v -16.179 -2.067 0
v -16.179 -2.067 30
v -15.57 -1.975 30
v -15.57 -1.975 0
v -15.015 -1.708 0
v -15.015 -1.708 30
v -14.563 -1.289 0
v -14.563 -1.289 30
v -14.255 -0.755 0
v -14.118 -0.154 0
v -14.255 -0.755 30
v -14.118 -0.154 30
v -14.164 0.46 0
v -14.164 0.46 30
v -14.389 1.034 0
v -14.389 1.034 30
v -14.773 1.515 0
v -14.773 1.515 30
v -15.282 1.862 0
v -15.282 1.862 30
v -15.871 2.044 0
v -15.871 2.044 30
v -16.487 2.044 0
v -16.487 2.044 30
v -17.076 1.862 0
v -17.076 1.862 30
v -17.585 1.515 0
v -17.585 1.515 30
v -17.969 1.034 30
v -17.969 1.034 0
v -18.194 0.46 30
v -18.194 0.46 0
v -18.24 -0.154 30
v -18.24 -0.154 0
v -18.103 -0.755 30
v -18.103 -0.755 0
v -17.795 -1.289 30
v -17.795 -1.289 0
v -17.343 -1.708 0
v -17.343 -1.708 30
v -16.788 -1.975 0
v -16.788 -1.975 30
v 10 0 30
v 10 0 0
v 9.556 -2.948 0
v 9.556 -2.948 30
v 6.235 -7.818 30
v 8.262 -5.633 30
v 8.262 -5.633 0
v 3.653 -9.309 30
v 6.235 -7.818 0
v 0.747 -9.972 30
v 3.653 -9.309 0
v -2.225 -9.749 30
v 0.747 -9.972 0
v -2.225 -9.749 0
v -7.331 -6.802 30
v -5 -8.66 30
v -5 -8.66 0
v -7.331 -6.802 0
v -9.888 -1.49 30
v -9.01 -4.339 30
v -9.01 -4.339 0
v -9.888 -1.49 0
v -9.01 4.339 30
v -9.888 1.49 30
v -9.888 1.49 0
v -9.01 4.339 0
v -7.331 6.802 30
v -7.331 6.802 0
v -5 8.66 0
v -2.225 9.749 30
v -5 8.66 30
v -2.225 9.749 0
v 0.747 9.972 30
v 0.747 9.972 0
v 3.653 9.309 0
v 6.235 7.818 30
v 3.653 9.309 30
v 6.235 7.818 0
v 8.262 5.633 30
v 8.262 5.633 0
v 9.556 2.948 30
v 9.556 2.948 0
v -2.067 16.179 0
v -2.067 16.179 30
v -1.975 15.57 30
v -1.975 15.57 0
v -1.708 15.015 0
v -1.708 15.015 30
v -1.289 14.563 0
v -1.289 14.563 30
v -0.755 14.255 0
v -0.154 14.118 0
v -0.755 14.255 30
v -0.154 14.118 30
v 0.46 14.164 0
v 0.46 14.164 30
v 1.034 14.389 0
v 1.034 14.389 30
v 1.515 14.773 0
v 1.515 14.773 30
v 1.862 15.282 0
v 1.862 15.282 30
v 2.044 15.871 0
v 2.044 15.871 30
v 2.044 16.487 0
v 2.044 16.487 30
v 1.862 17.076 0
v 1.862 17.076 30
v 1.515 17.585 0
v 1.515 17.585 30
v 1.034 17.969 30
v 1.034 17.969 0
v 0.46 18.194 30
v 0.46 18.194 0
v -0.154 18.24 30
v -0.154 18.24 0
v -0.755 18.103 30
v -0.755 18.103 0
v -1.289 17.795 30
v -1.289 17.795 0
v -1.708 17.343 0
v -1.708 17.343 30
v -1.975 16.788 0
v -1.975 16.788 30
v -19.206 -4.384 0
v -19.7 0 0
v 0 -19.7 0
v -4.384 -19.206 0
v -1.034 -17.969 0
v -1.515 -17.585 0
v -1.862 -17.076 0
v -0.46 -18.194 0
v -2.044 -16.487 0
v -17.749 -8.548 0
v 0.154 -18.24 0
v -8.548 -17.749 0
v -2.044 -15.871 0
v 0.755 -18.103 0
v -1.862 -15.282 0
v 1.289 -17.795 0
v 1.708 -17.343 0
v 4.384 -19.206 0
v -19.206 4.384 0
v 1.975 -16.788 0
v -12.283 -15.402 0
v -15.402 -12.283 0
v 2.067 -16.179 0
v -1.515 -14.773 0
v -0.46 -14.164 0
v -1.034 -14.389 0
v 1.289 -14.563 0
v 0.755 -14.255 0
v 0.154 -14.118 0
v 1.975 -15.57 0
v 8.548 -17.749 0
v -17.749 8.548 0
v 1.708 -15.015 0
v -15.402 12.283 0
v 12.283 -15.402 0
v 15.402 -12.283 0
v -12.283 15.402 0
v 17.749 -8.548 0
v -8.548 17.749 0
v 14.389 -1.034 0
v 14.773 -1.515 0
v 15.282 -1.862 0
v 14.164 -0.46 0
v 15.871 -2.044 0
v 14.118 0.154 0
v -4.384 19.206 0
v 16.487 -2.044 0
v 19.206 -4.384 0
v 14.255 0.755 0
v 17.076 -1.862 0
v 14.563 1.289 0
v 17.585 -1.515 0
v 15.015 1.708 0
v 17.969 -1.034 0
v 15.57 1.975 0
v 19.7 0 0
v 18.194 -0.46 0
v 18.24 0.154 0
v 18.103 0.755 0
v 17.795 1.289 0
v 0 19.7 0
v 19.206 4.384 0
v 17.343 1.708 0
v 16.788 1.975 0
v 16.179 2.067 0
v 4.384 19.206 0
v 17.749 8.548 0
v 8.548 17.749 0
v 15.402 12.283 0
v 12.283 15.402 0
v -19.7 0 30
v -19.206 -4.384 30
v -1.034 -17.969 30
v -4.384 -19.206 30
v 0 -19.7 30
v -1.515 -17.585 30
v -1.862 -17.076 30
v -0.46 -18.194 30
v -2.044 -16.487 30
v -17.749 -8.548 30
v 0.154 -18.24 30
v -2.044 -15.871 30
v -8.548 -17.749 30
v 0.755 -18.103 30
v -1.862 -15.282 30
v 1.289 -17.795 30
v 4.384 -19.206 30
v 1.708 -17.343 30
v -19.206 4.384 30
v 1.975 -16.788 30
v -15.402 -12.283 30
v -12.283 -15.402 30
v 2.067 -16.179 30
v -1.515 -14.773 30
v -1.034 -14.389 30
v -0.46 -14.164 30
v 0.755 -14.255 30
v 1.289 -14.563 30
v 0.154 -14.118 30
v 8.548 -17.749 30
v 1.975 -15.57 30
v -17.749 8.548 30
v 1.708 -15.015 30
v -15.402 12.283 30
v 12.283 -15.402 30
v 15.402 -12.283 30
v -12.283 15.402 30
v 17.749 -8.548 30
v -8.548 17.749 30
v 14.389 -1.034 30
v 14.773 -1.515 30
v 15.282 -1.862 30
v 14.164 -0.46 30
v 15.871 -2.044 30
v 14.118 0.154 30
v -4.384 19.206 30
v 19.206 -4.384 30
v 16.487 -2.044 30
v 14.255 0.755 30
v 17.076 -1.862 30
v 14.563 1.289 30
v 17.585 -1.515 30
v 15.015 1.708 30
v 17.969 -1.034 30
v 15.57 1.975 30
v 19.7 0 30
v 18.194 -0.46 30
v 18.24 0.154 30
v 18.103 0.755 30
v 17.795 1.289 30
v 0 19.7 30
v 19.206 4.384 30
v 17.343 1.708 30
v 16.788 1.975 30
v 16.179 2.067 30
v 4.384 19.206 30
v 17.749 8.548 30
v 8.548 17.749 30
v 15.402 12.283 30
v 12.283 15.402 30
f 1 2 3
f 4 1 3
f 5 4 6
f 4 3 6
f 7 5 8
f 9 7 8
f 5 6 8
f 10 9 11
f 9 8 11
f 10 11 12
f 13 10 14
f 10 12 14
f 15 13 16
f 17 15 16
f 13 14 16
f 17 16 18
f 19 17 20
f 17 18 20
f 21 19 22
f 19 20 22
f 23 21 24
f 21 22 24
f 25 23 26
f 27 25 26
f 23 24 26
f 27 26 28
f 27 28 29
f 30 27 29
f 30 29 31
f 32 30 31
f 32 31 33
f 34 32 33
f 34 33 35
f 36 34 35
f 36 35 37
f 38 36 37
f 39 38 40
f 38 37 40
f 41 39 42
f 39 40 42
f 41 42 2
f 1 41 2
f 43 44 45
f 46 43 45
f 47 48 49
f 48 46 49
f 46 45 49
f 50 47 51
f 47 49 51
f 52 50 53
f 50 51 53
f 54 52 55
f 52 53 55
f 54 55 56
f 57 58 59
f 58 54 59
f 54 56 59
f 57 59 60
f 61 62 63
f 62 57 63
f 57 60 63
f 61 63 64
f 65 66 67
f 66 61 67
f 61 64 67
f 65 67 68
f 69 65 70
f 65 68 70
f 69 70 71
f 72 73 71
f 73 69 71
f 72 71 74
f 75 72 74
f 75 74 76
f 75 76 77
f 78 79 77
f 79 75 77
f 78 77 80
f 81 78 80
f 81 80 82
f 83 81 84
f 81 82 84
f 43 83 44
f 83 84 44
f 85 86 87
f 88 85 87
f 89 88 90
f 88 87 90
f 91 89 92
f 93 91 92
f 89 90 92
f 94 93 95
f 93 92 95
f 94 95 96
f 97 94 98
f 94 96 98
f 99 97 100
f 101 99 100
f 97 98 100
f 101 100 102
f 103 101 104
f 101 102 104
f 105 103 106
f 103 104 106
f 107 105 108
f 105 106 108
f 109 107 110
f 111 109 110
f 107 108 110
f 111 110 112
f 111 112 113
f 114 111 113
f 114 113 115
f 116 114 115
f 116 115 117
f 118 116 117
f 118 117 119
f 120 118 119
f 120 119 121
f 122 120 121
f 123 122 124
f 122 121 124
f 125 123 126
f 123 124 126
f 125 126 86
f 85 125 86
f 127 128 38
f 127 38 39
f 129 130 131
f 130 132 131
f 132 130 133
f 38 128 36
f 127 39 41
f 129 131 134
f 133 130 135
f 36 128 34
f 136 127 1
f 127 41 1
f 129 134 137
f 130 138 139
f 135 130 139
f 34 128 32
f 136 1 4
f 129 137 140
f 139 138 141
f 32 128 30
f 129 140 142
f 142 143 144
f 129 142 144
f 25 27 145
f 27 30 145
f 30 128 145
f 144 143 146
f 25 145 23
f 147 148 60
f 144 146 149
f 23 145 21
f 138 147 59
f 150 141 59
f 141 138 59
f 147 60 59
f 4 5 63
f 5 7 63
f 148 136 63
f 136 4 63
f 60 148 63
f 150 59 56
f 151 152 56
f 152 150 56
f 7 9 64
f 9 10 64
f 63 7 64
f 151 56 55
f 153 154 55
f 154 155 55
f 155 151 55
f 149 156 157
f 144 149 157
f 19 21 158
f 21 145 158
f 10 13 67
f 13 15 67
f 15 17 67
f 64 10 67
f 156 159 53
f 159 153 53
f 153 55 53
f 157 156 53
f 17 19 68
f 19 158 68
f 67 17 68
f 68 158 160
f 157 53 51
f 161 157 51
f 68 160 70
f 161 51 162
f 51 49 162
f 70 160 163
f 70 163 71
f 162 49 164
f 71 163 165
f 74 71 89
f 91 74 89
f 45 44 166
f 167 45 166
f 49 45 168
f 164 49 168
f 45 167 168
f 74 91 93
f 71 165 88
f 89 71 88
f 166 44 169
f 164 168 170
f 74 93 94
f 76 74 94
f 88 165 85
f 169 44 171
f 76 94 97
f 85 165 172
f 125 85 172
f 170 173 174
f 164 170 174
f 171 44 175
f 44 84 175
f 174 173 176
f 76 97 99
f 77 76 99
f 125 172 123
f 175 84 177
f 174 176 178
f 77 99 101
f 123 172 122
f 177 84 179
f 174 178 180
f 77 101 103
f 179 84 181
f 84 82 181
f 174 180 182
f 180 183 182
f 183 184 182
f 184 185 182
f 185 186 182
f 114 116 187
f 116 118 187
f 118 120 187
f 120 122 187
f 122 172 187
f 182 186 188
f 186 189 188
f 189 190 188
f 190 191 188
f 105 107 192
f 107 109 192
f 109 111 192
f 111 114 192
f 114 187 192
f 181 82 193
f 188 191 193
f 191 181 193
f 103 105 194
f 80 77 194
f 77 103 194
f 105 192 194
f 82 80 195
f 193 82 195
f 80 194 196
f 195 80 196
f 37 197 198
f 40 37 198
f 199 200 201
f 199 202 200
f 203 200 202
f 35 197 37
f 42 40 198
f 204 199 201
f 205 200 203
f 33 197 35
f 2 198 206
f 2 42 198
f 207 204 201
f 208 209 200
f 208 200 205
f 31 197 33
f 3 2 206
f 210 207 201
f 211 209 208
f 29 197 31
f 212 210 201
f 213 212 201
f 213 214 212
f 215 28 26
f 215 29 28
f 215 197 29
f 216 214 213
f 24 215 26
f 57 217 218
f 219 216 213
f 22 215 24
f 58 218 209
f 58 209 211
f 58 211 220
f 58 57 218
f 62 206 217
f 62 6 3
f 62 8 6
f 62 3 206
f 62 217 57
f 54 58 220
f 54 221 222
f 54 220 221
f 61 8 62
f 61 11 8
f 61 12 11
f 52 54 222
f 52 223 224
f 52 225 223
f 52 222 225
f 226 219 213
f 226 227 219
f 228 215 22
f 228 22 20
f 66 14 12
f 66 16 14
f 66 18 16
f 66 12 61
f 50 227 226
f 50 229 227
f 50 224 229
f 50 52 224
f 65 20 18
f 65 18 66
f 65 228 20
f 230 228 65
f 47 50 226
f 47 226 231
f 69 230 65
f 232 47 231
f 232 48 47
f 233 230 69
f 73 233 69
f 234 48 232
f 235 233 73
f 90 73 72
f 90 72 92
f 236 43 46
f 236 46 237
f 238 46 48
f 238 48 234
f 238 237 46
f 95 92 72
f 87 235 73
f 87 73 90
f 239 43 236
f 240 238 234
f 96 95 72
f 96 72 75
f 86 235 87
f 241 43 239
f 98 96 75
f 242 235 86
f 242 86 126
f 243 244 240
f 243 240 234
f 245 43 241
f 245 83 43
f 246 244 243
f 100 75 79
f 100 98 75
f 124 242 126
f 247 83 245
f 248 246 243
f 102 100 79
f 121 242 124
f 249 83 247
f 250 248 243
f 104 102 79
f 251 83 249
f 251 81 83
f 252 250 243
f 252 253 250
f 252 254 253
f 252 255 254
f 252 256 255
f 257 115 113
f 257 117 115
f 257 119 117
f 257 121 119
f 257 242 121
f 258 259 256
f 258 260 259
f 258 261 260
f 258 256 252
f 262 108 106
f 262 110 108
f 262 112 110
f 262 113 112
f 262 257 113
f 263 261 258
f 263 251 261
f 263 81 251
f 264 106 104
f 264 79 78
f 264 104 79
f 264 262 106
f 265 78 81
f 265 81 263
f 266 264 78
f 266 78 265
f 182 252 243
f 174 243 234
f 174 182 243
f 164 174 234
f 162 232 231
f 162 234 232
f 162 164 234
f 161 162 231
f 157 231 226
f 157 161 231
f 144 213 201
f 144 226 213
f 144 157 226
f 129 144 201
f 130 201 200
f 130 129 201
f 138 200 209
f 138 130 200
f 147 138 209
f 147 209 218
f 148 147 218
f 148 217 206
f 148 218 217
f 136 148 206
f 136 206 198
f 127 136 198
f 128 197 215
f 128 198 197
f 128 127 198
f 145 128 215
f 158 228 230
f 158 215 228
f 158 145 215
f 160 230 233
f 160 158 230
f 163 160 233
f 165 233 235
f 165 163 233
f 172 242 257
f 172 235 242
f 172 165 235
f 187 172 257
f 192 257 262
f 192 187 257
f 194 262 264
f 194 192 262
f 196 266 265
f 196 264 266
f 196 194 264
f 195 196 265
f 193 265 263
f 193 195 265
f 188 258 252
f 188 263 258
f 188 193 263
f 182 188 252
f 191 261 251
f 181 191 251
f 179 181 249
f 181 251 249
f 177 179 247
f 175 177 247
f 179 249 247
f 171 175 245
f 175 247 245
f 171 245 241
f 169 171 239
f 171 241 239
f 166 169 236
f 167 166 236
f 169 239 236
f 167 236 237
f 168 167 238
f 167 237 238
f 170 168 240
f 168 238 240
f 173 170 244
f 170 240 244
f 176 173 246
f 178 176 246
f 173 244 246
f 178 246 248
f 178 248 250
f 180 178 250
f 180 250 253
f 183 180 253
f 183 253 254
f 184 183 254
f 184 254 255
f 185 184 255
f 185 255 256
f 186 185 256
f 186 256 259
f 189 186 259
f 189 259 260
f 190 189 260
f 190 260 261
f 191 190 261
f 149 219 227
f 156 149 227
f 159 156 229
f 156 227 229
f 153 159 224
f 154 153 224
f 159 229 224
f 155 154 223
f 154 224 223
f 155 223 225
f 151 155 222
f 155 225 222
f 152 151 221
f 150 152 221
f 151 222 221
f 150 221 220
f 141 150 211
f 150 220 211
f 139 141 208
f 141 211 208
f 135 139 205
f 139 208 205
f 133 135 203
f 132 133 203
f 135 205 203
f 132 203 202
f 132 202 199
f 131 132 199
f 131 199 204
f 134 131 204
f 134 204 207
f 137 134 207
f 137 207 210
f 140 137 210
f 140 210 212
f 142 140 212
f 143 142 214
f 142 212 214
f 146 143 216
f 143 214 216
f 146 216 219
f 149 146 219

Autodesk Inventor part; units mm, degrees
ref_plane "YZ Plane" through (0, 0, 0) normal (1, 0, 0) x (0, 1, 0)
ref_plane "XZ Plane" through (0, 0, 0) normal (0, 1, 0) x (-1, 0, 0)
ref_plane "XY Plane" through (0, 0, 0) normal (0, 0, 1) x (1, 0, 0)
sketch "草圖1" plane through (0, 0, 0) normal (0, 0, 1) x (1, 0, 0)
  line L0 (0, 27.58) -> (0, -27.58) construction
  line L1 (0, -27.58) -> (0, 27.58) construction
  line L2 (-27.58, 0) -> (27.58, 0) construction
  circle A0 centre (0, 0) radius 10
  circle A1 centre (0, 0) radius 16.179 construction
  circle A2 centre (0, 0) radius 19.7
  point P0 (16.179, 0)
  dimension "d1" = 32.358
  dimension "d0" = 20
  dimension "d2" = 39.4
extrude "擠出1" add sketch "草圖1" along normal blind 30
hole "孔1" at (16.179, 0, 0) direction (0, 0, 1) diameter 4.134 depth 61.1
pattern_circular "環形陣列1" count 4 over 360 about axis through (0, 0, 0) along (0, 0, 1) of "孔1"
properties part number "轉接版"
